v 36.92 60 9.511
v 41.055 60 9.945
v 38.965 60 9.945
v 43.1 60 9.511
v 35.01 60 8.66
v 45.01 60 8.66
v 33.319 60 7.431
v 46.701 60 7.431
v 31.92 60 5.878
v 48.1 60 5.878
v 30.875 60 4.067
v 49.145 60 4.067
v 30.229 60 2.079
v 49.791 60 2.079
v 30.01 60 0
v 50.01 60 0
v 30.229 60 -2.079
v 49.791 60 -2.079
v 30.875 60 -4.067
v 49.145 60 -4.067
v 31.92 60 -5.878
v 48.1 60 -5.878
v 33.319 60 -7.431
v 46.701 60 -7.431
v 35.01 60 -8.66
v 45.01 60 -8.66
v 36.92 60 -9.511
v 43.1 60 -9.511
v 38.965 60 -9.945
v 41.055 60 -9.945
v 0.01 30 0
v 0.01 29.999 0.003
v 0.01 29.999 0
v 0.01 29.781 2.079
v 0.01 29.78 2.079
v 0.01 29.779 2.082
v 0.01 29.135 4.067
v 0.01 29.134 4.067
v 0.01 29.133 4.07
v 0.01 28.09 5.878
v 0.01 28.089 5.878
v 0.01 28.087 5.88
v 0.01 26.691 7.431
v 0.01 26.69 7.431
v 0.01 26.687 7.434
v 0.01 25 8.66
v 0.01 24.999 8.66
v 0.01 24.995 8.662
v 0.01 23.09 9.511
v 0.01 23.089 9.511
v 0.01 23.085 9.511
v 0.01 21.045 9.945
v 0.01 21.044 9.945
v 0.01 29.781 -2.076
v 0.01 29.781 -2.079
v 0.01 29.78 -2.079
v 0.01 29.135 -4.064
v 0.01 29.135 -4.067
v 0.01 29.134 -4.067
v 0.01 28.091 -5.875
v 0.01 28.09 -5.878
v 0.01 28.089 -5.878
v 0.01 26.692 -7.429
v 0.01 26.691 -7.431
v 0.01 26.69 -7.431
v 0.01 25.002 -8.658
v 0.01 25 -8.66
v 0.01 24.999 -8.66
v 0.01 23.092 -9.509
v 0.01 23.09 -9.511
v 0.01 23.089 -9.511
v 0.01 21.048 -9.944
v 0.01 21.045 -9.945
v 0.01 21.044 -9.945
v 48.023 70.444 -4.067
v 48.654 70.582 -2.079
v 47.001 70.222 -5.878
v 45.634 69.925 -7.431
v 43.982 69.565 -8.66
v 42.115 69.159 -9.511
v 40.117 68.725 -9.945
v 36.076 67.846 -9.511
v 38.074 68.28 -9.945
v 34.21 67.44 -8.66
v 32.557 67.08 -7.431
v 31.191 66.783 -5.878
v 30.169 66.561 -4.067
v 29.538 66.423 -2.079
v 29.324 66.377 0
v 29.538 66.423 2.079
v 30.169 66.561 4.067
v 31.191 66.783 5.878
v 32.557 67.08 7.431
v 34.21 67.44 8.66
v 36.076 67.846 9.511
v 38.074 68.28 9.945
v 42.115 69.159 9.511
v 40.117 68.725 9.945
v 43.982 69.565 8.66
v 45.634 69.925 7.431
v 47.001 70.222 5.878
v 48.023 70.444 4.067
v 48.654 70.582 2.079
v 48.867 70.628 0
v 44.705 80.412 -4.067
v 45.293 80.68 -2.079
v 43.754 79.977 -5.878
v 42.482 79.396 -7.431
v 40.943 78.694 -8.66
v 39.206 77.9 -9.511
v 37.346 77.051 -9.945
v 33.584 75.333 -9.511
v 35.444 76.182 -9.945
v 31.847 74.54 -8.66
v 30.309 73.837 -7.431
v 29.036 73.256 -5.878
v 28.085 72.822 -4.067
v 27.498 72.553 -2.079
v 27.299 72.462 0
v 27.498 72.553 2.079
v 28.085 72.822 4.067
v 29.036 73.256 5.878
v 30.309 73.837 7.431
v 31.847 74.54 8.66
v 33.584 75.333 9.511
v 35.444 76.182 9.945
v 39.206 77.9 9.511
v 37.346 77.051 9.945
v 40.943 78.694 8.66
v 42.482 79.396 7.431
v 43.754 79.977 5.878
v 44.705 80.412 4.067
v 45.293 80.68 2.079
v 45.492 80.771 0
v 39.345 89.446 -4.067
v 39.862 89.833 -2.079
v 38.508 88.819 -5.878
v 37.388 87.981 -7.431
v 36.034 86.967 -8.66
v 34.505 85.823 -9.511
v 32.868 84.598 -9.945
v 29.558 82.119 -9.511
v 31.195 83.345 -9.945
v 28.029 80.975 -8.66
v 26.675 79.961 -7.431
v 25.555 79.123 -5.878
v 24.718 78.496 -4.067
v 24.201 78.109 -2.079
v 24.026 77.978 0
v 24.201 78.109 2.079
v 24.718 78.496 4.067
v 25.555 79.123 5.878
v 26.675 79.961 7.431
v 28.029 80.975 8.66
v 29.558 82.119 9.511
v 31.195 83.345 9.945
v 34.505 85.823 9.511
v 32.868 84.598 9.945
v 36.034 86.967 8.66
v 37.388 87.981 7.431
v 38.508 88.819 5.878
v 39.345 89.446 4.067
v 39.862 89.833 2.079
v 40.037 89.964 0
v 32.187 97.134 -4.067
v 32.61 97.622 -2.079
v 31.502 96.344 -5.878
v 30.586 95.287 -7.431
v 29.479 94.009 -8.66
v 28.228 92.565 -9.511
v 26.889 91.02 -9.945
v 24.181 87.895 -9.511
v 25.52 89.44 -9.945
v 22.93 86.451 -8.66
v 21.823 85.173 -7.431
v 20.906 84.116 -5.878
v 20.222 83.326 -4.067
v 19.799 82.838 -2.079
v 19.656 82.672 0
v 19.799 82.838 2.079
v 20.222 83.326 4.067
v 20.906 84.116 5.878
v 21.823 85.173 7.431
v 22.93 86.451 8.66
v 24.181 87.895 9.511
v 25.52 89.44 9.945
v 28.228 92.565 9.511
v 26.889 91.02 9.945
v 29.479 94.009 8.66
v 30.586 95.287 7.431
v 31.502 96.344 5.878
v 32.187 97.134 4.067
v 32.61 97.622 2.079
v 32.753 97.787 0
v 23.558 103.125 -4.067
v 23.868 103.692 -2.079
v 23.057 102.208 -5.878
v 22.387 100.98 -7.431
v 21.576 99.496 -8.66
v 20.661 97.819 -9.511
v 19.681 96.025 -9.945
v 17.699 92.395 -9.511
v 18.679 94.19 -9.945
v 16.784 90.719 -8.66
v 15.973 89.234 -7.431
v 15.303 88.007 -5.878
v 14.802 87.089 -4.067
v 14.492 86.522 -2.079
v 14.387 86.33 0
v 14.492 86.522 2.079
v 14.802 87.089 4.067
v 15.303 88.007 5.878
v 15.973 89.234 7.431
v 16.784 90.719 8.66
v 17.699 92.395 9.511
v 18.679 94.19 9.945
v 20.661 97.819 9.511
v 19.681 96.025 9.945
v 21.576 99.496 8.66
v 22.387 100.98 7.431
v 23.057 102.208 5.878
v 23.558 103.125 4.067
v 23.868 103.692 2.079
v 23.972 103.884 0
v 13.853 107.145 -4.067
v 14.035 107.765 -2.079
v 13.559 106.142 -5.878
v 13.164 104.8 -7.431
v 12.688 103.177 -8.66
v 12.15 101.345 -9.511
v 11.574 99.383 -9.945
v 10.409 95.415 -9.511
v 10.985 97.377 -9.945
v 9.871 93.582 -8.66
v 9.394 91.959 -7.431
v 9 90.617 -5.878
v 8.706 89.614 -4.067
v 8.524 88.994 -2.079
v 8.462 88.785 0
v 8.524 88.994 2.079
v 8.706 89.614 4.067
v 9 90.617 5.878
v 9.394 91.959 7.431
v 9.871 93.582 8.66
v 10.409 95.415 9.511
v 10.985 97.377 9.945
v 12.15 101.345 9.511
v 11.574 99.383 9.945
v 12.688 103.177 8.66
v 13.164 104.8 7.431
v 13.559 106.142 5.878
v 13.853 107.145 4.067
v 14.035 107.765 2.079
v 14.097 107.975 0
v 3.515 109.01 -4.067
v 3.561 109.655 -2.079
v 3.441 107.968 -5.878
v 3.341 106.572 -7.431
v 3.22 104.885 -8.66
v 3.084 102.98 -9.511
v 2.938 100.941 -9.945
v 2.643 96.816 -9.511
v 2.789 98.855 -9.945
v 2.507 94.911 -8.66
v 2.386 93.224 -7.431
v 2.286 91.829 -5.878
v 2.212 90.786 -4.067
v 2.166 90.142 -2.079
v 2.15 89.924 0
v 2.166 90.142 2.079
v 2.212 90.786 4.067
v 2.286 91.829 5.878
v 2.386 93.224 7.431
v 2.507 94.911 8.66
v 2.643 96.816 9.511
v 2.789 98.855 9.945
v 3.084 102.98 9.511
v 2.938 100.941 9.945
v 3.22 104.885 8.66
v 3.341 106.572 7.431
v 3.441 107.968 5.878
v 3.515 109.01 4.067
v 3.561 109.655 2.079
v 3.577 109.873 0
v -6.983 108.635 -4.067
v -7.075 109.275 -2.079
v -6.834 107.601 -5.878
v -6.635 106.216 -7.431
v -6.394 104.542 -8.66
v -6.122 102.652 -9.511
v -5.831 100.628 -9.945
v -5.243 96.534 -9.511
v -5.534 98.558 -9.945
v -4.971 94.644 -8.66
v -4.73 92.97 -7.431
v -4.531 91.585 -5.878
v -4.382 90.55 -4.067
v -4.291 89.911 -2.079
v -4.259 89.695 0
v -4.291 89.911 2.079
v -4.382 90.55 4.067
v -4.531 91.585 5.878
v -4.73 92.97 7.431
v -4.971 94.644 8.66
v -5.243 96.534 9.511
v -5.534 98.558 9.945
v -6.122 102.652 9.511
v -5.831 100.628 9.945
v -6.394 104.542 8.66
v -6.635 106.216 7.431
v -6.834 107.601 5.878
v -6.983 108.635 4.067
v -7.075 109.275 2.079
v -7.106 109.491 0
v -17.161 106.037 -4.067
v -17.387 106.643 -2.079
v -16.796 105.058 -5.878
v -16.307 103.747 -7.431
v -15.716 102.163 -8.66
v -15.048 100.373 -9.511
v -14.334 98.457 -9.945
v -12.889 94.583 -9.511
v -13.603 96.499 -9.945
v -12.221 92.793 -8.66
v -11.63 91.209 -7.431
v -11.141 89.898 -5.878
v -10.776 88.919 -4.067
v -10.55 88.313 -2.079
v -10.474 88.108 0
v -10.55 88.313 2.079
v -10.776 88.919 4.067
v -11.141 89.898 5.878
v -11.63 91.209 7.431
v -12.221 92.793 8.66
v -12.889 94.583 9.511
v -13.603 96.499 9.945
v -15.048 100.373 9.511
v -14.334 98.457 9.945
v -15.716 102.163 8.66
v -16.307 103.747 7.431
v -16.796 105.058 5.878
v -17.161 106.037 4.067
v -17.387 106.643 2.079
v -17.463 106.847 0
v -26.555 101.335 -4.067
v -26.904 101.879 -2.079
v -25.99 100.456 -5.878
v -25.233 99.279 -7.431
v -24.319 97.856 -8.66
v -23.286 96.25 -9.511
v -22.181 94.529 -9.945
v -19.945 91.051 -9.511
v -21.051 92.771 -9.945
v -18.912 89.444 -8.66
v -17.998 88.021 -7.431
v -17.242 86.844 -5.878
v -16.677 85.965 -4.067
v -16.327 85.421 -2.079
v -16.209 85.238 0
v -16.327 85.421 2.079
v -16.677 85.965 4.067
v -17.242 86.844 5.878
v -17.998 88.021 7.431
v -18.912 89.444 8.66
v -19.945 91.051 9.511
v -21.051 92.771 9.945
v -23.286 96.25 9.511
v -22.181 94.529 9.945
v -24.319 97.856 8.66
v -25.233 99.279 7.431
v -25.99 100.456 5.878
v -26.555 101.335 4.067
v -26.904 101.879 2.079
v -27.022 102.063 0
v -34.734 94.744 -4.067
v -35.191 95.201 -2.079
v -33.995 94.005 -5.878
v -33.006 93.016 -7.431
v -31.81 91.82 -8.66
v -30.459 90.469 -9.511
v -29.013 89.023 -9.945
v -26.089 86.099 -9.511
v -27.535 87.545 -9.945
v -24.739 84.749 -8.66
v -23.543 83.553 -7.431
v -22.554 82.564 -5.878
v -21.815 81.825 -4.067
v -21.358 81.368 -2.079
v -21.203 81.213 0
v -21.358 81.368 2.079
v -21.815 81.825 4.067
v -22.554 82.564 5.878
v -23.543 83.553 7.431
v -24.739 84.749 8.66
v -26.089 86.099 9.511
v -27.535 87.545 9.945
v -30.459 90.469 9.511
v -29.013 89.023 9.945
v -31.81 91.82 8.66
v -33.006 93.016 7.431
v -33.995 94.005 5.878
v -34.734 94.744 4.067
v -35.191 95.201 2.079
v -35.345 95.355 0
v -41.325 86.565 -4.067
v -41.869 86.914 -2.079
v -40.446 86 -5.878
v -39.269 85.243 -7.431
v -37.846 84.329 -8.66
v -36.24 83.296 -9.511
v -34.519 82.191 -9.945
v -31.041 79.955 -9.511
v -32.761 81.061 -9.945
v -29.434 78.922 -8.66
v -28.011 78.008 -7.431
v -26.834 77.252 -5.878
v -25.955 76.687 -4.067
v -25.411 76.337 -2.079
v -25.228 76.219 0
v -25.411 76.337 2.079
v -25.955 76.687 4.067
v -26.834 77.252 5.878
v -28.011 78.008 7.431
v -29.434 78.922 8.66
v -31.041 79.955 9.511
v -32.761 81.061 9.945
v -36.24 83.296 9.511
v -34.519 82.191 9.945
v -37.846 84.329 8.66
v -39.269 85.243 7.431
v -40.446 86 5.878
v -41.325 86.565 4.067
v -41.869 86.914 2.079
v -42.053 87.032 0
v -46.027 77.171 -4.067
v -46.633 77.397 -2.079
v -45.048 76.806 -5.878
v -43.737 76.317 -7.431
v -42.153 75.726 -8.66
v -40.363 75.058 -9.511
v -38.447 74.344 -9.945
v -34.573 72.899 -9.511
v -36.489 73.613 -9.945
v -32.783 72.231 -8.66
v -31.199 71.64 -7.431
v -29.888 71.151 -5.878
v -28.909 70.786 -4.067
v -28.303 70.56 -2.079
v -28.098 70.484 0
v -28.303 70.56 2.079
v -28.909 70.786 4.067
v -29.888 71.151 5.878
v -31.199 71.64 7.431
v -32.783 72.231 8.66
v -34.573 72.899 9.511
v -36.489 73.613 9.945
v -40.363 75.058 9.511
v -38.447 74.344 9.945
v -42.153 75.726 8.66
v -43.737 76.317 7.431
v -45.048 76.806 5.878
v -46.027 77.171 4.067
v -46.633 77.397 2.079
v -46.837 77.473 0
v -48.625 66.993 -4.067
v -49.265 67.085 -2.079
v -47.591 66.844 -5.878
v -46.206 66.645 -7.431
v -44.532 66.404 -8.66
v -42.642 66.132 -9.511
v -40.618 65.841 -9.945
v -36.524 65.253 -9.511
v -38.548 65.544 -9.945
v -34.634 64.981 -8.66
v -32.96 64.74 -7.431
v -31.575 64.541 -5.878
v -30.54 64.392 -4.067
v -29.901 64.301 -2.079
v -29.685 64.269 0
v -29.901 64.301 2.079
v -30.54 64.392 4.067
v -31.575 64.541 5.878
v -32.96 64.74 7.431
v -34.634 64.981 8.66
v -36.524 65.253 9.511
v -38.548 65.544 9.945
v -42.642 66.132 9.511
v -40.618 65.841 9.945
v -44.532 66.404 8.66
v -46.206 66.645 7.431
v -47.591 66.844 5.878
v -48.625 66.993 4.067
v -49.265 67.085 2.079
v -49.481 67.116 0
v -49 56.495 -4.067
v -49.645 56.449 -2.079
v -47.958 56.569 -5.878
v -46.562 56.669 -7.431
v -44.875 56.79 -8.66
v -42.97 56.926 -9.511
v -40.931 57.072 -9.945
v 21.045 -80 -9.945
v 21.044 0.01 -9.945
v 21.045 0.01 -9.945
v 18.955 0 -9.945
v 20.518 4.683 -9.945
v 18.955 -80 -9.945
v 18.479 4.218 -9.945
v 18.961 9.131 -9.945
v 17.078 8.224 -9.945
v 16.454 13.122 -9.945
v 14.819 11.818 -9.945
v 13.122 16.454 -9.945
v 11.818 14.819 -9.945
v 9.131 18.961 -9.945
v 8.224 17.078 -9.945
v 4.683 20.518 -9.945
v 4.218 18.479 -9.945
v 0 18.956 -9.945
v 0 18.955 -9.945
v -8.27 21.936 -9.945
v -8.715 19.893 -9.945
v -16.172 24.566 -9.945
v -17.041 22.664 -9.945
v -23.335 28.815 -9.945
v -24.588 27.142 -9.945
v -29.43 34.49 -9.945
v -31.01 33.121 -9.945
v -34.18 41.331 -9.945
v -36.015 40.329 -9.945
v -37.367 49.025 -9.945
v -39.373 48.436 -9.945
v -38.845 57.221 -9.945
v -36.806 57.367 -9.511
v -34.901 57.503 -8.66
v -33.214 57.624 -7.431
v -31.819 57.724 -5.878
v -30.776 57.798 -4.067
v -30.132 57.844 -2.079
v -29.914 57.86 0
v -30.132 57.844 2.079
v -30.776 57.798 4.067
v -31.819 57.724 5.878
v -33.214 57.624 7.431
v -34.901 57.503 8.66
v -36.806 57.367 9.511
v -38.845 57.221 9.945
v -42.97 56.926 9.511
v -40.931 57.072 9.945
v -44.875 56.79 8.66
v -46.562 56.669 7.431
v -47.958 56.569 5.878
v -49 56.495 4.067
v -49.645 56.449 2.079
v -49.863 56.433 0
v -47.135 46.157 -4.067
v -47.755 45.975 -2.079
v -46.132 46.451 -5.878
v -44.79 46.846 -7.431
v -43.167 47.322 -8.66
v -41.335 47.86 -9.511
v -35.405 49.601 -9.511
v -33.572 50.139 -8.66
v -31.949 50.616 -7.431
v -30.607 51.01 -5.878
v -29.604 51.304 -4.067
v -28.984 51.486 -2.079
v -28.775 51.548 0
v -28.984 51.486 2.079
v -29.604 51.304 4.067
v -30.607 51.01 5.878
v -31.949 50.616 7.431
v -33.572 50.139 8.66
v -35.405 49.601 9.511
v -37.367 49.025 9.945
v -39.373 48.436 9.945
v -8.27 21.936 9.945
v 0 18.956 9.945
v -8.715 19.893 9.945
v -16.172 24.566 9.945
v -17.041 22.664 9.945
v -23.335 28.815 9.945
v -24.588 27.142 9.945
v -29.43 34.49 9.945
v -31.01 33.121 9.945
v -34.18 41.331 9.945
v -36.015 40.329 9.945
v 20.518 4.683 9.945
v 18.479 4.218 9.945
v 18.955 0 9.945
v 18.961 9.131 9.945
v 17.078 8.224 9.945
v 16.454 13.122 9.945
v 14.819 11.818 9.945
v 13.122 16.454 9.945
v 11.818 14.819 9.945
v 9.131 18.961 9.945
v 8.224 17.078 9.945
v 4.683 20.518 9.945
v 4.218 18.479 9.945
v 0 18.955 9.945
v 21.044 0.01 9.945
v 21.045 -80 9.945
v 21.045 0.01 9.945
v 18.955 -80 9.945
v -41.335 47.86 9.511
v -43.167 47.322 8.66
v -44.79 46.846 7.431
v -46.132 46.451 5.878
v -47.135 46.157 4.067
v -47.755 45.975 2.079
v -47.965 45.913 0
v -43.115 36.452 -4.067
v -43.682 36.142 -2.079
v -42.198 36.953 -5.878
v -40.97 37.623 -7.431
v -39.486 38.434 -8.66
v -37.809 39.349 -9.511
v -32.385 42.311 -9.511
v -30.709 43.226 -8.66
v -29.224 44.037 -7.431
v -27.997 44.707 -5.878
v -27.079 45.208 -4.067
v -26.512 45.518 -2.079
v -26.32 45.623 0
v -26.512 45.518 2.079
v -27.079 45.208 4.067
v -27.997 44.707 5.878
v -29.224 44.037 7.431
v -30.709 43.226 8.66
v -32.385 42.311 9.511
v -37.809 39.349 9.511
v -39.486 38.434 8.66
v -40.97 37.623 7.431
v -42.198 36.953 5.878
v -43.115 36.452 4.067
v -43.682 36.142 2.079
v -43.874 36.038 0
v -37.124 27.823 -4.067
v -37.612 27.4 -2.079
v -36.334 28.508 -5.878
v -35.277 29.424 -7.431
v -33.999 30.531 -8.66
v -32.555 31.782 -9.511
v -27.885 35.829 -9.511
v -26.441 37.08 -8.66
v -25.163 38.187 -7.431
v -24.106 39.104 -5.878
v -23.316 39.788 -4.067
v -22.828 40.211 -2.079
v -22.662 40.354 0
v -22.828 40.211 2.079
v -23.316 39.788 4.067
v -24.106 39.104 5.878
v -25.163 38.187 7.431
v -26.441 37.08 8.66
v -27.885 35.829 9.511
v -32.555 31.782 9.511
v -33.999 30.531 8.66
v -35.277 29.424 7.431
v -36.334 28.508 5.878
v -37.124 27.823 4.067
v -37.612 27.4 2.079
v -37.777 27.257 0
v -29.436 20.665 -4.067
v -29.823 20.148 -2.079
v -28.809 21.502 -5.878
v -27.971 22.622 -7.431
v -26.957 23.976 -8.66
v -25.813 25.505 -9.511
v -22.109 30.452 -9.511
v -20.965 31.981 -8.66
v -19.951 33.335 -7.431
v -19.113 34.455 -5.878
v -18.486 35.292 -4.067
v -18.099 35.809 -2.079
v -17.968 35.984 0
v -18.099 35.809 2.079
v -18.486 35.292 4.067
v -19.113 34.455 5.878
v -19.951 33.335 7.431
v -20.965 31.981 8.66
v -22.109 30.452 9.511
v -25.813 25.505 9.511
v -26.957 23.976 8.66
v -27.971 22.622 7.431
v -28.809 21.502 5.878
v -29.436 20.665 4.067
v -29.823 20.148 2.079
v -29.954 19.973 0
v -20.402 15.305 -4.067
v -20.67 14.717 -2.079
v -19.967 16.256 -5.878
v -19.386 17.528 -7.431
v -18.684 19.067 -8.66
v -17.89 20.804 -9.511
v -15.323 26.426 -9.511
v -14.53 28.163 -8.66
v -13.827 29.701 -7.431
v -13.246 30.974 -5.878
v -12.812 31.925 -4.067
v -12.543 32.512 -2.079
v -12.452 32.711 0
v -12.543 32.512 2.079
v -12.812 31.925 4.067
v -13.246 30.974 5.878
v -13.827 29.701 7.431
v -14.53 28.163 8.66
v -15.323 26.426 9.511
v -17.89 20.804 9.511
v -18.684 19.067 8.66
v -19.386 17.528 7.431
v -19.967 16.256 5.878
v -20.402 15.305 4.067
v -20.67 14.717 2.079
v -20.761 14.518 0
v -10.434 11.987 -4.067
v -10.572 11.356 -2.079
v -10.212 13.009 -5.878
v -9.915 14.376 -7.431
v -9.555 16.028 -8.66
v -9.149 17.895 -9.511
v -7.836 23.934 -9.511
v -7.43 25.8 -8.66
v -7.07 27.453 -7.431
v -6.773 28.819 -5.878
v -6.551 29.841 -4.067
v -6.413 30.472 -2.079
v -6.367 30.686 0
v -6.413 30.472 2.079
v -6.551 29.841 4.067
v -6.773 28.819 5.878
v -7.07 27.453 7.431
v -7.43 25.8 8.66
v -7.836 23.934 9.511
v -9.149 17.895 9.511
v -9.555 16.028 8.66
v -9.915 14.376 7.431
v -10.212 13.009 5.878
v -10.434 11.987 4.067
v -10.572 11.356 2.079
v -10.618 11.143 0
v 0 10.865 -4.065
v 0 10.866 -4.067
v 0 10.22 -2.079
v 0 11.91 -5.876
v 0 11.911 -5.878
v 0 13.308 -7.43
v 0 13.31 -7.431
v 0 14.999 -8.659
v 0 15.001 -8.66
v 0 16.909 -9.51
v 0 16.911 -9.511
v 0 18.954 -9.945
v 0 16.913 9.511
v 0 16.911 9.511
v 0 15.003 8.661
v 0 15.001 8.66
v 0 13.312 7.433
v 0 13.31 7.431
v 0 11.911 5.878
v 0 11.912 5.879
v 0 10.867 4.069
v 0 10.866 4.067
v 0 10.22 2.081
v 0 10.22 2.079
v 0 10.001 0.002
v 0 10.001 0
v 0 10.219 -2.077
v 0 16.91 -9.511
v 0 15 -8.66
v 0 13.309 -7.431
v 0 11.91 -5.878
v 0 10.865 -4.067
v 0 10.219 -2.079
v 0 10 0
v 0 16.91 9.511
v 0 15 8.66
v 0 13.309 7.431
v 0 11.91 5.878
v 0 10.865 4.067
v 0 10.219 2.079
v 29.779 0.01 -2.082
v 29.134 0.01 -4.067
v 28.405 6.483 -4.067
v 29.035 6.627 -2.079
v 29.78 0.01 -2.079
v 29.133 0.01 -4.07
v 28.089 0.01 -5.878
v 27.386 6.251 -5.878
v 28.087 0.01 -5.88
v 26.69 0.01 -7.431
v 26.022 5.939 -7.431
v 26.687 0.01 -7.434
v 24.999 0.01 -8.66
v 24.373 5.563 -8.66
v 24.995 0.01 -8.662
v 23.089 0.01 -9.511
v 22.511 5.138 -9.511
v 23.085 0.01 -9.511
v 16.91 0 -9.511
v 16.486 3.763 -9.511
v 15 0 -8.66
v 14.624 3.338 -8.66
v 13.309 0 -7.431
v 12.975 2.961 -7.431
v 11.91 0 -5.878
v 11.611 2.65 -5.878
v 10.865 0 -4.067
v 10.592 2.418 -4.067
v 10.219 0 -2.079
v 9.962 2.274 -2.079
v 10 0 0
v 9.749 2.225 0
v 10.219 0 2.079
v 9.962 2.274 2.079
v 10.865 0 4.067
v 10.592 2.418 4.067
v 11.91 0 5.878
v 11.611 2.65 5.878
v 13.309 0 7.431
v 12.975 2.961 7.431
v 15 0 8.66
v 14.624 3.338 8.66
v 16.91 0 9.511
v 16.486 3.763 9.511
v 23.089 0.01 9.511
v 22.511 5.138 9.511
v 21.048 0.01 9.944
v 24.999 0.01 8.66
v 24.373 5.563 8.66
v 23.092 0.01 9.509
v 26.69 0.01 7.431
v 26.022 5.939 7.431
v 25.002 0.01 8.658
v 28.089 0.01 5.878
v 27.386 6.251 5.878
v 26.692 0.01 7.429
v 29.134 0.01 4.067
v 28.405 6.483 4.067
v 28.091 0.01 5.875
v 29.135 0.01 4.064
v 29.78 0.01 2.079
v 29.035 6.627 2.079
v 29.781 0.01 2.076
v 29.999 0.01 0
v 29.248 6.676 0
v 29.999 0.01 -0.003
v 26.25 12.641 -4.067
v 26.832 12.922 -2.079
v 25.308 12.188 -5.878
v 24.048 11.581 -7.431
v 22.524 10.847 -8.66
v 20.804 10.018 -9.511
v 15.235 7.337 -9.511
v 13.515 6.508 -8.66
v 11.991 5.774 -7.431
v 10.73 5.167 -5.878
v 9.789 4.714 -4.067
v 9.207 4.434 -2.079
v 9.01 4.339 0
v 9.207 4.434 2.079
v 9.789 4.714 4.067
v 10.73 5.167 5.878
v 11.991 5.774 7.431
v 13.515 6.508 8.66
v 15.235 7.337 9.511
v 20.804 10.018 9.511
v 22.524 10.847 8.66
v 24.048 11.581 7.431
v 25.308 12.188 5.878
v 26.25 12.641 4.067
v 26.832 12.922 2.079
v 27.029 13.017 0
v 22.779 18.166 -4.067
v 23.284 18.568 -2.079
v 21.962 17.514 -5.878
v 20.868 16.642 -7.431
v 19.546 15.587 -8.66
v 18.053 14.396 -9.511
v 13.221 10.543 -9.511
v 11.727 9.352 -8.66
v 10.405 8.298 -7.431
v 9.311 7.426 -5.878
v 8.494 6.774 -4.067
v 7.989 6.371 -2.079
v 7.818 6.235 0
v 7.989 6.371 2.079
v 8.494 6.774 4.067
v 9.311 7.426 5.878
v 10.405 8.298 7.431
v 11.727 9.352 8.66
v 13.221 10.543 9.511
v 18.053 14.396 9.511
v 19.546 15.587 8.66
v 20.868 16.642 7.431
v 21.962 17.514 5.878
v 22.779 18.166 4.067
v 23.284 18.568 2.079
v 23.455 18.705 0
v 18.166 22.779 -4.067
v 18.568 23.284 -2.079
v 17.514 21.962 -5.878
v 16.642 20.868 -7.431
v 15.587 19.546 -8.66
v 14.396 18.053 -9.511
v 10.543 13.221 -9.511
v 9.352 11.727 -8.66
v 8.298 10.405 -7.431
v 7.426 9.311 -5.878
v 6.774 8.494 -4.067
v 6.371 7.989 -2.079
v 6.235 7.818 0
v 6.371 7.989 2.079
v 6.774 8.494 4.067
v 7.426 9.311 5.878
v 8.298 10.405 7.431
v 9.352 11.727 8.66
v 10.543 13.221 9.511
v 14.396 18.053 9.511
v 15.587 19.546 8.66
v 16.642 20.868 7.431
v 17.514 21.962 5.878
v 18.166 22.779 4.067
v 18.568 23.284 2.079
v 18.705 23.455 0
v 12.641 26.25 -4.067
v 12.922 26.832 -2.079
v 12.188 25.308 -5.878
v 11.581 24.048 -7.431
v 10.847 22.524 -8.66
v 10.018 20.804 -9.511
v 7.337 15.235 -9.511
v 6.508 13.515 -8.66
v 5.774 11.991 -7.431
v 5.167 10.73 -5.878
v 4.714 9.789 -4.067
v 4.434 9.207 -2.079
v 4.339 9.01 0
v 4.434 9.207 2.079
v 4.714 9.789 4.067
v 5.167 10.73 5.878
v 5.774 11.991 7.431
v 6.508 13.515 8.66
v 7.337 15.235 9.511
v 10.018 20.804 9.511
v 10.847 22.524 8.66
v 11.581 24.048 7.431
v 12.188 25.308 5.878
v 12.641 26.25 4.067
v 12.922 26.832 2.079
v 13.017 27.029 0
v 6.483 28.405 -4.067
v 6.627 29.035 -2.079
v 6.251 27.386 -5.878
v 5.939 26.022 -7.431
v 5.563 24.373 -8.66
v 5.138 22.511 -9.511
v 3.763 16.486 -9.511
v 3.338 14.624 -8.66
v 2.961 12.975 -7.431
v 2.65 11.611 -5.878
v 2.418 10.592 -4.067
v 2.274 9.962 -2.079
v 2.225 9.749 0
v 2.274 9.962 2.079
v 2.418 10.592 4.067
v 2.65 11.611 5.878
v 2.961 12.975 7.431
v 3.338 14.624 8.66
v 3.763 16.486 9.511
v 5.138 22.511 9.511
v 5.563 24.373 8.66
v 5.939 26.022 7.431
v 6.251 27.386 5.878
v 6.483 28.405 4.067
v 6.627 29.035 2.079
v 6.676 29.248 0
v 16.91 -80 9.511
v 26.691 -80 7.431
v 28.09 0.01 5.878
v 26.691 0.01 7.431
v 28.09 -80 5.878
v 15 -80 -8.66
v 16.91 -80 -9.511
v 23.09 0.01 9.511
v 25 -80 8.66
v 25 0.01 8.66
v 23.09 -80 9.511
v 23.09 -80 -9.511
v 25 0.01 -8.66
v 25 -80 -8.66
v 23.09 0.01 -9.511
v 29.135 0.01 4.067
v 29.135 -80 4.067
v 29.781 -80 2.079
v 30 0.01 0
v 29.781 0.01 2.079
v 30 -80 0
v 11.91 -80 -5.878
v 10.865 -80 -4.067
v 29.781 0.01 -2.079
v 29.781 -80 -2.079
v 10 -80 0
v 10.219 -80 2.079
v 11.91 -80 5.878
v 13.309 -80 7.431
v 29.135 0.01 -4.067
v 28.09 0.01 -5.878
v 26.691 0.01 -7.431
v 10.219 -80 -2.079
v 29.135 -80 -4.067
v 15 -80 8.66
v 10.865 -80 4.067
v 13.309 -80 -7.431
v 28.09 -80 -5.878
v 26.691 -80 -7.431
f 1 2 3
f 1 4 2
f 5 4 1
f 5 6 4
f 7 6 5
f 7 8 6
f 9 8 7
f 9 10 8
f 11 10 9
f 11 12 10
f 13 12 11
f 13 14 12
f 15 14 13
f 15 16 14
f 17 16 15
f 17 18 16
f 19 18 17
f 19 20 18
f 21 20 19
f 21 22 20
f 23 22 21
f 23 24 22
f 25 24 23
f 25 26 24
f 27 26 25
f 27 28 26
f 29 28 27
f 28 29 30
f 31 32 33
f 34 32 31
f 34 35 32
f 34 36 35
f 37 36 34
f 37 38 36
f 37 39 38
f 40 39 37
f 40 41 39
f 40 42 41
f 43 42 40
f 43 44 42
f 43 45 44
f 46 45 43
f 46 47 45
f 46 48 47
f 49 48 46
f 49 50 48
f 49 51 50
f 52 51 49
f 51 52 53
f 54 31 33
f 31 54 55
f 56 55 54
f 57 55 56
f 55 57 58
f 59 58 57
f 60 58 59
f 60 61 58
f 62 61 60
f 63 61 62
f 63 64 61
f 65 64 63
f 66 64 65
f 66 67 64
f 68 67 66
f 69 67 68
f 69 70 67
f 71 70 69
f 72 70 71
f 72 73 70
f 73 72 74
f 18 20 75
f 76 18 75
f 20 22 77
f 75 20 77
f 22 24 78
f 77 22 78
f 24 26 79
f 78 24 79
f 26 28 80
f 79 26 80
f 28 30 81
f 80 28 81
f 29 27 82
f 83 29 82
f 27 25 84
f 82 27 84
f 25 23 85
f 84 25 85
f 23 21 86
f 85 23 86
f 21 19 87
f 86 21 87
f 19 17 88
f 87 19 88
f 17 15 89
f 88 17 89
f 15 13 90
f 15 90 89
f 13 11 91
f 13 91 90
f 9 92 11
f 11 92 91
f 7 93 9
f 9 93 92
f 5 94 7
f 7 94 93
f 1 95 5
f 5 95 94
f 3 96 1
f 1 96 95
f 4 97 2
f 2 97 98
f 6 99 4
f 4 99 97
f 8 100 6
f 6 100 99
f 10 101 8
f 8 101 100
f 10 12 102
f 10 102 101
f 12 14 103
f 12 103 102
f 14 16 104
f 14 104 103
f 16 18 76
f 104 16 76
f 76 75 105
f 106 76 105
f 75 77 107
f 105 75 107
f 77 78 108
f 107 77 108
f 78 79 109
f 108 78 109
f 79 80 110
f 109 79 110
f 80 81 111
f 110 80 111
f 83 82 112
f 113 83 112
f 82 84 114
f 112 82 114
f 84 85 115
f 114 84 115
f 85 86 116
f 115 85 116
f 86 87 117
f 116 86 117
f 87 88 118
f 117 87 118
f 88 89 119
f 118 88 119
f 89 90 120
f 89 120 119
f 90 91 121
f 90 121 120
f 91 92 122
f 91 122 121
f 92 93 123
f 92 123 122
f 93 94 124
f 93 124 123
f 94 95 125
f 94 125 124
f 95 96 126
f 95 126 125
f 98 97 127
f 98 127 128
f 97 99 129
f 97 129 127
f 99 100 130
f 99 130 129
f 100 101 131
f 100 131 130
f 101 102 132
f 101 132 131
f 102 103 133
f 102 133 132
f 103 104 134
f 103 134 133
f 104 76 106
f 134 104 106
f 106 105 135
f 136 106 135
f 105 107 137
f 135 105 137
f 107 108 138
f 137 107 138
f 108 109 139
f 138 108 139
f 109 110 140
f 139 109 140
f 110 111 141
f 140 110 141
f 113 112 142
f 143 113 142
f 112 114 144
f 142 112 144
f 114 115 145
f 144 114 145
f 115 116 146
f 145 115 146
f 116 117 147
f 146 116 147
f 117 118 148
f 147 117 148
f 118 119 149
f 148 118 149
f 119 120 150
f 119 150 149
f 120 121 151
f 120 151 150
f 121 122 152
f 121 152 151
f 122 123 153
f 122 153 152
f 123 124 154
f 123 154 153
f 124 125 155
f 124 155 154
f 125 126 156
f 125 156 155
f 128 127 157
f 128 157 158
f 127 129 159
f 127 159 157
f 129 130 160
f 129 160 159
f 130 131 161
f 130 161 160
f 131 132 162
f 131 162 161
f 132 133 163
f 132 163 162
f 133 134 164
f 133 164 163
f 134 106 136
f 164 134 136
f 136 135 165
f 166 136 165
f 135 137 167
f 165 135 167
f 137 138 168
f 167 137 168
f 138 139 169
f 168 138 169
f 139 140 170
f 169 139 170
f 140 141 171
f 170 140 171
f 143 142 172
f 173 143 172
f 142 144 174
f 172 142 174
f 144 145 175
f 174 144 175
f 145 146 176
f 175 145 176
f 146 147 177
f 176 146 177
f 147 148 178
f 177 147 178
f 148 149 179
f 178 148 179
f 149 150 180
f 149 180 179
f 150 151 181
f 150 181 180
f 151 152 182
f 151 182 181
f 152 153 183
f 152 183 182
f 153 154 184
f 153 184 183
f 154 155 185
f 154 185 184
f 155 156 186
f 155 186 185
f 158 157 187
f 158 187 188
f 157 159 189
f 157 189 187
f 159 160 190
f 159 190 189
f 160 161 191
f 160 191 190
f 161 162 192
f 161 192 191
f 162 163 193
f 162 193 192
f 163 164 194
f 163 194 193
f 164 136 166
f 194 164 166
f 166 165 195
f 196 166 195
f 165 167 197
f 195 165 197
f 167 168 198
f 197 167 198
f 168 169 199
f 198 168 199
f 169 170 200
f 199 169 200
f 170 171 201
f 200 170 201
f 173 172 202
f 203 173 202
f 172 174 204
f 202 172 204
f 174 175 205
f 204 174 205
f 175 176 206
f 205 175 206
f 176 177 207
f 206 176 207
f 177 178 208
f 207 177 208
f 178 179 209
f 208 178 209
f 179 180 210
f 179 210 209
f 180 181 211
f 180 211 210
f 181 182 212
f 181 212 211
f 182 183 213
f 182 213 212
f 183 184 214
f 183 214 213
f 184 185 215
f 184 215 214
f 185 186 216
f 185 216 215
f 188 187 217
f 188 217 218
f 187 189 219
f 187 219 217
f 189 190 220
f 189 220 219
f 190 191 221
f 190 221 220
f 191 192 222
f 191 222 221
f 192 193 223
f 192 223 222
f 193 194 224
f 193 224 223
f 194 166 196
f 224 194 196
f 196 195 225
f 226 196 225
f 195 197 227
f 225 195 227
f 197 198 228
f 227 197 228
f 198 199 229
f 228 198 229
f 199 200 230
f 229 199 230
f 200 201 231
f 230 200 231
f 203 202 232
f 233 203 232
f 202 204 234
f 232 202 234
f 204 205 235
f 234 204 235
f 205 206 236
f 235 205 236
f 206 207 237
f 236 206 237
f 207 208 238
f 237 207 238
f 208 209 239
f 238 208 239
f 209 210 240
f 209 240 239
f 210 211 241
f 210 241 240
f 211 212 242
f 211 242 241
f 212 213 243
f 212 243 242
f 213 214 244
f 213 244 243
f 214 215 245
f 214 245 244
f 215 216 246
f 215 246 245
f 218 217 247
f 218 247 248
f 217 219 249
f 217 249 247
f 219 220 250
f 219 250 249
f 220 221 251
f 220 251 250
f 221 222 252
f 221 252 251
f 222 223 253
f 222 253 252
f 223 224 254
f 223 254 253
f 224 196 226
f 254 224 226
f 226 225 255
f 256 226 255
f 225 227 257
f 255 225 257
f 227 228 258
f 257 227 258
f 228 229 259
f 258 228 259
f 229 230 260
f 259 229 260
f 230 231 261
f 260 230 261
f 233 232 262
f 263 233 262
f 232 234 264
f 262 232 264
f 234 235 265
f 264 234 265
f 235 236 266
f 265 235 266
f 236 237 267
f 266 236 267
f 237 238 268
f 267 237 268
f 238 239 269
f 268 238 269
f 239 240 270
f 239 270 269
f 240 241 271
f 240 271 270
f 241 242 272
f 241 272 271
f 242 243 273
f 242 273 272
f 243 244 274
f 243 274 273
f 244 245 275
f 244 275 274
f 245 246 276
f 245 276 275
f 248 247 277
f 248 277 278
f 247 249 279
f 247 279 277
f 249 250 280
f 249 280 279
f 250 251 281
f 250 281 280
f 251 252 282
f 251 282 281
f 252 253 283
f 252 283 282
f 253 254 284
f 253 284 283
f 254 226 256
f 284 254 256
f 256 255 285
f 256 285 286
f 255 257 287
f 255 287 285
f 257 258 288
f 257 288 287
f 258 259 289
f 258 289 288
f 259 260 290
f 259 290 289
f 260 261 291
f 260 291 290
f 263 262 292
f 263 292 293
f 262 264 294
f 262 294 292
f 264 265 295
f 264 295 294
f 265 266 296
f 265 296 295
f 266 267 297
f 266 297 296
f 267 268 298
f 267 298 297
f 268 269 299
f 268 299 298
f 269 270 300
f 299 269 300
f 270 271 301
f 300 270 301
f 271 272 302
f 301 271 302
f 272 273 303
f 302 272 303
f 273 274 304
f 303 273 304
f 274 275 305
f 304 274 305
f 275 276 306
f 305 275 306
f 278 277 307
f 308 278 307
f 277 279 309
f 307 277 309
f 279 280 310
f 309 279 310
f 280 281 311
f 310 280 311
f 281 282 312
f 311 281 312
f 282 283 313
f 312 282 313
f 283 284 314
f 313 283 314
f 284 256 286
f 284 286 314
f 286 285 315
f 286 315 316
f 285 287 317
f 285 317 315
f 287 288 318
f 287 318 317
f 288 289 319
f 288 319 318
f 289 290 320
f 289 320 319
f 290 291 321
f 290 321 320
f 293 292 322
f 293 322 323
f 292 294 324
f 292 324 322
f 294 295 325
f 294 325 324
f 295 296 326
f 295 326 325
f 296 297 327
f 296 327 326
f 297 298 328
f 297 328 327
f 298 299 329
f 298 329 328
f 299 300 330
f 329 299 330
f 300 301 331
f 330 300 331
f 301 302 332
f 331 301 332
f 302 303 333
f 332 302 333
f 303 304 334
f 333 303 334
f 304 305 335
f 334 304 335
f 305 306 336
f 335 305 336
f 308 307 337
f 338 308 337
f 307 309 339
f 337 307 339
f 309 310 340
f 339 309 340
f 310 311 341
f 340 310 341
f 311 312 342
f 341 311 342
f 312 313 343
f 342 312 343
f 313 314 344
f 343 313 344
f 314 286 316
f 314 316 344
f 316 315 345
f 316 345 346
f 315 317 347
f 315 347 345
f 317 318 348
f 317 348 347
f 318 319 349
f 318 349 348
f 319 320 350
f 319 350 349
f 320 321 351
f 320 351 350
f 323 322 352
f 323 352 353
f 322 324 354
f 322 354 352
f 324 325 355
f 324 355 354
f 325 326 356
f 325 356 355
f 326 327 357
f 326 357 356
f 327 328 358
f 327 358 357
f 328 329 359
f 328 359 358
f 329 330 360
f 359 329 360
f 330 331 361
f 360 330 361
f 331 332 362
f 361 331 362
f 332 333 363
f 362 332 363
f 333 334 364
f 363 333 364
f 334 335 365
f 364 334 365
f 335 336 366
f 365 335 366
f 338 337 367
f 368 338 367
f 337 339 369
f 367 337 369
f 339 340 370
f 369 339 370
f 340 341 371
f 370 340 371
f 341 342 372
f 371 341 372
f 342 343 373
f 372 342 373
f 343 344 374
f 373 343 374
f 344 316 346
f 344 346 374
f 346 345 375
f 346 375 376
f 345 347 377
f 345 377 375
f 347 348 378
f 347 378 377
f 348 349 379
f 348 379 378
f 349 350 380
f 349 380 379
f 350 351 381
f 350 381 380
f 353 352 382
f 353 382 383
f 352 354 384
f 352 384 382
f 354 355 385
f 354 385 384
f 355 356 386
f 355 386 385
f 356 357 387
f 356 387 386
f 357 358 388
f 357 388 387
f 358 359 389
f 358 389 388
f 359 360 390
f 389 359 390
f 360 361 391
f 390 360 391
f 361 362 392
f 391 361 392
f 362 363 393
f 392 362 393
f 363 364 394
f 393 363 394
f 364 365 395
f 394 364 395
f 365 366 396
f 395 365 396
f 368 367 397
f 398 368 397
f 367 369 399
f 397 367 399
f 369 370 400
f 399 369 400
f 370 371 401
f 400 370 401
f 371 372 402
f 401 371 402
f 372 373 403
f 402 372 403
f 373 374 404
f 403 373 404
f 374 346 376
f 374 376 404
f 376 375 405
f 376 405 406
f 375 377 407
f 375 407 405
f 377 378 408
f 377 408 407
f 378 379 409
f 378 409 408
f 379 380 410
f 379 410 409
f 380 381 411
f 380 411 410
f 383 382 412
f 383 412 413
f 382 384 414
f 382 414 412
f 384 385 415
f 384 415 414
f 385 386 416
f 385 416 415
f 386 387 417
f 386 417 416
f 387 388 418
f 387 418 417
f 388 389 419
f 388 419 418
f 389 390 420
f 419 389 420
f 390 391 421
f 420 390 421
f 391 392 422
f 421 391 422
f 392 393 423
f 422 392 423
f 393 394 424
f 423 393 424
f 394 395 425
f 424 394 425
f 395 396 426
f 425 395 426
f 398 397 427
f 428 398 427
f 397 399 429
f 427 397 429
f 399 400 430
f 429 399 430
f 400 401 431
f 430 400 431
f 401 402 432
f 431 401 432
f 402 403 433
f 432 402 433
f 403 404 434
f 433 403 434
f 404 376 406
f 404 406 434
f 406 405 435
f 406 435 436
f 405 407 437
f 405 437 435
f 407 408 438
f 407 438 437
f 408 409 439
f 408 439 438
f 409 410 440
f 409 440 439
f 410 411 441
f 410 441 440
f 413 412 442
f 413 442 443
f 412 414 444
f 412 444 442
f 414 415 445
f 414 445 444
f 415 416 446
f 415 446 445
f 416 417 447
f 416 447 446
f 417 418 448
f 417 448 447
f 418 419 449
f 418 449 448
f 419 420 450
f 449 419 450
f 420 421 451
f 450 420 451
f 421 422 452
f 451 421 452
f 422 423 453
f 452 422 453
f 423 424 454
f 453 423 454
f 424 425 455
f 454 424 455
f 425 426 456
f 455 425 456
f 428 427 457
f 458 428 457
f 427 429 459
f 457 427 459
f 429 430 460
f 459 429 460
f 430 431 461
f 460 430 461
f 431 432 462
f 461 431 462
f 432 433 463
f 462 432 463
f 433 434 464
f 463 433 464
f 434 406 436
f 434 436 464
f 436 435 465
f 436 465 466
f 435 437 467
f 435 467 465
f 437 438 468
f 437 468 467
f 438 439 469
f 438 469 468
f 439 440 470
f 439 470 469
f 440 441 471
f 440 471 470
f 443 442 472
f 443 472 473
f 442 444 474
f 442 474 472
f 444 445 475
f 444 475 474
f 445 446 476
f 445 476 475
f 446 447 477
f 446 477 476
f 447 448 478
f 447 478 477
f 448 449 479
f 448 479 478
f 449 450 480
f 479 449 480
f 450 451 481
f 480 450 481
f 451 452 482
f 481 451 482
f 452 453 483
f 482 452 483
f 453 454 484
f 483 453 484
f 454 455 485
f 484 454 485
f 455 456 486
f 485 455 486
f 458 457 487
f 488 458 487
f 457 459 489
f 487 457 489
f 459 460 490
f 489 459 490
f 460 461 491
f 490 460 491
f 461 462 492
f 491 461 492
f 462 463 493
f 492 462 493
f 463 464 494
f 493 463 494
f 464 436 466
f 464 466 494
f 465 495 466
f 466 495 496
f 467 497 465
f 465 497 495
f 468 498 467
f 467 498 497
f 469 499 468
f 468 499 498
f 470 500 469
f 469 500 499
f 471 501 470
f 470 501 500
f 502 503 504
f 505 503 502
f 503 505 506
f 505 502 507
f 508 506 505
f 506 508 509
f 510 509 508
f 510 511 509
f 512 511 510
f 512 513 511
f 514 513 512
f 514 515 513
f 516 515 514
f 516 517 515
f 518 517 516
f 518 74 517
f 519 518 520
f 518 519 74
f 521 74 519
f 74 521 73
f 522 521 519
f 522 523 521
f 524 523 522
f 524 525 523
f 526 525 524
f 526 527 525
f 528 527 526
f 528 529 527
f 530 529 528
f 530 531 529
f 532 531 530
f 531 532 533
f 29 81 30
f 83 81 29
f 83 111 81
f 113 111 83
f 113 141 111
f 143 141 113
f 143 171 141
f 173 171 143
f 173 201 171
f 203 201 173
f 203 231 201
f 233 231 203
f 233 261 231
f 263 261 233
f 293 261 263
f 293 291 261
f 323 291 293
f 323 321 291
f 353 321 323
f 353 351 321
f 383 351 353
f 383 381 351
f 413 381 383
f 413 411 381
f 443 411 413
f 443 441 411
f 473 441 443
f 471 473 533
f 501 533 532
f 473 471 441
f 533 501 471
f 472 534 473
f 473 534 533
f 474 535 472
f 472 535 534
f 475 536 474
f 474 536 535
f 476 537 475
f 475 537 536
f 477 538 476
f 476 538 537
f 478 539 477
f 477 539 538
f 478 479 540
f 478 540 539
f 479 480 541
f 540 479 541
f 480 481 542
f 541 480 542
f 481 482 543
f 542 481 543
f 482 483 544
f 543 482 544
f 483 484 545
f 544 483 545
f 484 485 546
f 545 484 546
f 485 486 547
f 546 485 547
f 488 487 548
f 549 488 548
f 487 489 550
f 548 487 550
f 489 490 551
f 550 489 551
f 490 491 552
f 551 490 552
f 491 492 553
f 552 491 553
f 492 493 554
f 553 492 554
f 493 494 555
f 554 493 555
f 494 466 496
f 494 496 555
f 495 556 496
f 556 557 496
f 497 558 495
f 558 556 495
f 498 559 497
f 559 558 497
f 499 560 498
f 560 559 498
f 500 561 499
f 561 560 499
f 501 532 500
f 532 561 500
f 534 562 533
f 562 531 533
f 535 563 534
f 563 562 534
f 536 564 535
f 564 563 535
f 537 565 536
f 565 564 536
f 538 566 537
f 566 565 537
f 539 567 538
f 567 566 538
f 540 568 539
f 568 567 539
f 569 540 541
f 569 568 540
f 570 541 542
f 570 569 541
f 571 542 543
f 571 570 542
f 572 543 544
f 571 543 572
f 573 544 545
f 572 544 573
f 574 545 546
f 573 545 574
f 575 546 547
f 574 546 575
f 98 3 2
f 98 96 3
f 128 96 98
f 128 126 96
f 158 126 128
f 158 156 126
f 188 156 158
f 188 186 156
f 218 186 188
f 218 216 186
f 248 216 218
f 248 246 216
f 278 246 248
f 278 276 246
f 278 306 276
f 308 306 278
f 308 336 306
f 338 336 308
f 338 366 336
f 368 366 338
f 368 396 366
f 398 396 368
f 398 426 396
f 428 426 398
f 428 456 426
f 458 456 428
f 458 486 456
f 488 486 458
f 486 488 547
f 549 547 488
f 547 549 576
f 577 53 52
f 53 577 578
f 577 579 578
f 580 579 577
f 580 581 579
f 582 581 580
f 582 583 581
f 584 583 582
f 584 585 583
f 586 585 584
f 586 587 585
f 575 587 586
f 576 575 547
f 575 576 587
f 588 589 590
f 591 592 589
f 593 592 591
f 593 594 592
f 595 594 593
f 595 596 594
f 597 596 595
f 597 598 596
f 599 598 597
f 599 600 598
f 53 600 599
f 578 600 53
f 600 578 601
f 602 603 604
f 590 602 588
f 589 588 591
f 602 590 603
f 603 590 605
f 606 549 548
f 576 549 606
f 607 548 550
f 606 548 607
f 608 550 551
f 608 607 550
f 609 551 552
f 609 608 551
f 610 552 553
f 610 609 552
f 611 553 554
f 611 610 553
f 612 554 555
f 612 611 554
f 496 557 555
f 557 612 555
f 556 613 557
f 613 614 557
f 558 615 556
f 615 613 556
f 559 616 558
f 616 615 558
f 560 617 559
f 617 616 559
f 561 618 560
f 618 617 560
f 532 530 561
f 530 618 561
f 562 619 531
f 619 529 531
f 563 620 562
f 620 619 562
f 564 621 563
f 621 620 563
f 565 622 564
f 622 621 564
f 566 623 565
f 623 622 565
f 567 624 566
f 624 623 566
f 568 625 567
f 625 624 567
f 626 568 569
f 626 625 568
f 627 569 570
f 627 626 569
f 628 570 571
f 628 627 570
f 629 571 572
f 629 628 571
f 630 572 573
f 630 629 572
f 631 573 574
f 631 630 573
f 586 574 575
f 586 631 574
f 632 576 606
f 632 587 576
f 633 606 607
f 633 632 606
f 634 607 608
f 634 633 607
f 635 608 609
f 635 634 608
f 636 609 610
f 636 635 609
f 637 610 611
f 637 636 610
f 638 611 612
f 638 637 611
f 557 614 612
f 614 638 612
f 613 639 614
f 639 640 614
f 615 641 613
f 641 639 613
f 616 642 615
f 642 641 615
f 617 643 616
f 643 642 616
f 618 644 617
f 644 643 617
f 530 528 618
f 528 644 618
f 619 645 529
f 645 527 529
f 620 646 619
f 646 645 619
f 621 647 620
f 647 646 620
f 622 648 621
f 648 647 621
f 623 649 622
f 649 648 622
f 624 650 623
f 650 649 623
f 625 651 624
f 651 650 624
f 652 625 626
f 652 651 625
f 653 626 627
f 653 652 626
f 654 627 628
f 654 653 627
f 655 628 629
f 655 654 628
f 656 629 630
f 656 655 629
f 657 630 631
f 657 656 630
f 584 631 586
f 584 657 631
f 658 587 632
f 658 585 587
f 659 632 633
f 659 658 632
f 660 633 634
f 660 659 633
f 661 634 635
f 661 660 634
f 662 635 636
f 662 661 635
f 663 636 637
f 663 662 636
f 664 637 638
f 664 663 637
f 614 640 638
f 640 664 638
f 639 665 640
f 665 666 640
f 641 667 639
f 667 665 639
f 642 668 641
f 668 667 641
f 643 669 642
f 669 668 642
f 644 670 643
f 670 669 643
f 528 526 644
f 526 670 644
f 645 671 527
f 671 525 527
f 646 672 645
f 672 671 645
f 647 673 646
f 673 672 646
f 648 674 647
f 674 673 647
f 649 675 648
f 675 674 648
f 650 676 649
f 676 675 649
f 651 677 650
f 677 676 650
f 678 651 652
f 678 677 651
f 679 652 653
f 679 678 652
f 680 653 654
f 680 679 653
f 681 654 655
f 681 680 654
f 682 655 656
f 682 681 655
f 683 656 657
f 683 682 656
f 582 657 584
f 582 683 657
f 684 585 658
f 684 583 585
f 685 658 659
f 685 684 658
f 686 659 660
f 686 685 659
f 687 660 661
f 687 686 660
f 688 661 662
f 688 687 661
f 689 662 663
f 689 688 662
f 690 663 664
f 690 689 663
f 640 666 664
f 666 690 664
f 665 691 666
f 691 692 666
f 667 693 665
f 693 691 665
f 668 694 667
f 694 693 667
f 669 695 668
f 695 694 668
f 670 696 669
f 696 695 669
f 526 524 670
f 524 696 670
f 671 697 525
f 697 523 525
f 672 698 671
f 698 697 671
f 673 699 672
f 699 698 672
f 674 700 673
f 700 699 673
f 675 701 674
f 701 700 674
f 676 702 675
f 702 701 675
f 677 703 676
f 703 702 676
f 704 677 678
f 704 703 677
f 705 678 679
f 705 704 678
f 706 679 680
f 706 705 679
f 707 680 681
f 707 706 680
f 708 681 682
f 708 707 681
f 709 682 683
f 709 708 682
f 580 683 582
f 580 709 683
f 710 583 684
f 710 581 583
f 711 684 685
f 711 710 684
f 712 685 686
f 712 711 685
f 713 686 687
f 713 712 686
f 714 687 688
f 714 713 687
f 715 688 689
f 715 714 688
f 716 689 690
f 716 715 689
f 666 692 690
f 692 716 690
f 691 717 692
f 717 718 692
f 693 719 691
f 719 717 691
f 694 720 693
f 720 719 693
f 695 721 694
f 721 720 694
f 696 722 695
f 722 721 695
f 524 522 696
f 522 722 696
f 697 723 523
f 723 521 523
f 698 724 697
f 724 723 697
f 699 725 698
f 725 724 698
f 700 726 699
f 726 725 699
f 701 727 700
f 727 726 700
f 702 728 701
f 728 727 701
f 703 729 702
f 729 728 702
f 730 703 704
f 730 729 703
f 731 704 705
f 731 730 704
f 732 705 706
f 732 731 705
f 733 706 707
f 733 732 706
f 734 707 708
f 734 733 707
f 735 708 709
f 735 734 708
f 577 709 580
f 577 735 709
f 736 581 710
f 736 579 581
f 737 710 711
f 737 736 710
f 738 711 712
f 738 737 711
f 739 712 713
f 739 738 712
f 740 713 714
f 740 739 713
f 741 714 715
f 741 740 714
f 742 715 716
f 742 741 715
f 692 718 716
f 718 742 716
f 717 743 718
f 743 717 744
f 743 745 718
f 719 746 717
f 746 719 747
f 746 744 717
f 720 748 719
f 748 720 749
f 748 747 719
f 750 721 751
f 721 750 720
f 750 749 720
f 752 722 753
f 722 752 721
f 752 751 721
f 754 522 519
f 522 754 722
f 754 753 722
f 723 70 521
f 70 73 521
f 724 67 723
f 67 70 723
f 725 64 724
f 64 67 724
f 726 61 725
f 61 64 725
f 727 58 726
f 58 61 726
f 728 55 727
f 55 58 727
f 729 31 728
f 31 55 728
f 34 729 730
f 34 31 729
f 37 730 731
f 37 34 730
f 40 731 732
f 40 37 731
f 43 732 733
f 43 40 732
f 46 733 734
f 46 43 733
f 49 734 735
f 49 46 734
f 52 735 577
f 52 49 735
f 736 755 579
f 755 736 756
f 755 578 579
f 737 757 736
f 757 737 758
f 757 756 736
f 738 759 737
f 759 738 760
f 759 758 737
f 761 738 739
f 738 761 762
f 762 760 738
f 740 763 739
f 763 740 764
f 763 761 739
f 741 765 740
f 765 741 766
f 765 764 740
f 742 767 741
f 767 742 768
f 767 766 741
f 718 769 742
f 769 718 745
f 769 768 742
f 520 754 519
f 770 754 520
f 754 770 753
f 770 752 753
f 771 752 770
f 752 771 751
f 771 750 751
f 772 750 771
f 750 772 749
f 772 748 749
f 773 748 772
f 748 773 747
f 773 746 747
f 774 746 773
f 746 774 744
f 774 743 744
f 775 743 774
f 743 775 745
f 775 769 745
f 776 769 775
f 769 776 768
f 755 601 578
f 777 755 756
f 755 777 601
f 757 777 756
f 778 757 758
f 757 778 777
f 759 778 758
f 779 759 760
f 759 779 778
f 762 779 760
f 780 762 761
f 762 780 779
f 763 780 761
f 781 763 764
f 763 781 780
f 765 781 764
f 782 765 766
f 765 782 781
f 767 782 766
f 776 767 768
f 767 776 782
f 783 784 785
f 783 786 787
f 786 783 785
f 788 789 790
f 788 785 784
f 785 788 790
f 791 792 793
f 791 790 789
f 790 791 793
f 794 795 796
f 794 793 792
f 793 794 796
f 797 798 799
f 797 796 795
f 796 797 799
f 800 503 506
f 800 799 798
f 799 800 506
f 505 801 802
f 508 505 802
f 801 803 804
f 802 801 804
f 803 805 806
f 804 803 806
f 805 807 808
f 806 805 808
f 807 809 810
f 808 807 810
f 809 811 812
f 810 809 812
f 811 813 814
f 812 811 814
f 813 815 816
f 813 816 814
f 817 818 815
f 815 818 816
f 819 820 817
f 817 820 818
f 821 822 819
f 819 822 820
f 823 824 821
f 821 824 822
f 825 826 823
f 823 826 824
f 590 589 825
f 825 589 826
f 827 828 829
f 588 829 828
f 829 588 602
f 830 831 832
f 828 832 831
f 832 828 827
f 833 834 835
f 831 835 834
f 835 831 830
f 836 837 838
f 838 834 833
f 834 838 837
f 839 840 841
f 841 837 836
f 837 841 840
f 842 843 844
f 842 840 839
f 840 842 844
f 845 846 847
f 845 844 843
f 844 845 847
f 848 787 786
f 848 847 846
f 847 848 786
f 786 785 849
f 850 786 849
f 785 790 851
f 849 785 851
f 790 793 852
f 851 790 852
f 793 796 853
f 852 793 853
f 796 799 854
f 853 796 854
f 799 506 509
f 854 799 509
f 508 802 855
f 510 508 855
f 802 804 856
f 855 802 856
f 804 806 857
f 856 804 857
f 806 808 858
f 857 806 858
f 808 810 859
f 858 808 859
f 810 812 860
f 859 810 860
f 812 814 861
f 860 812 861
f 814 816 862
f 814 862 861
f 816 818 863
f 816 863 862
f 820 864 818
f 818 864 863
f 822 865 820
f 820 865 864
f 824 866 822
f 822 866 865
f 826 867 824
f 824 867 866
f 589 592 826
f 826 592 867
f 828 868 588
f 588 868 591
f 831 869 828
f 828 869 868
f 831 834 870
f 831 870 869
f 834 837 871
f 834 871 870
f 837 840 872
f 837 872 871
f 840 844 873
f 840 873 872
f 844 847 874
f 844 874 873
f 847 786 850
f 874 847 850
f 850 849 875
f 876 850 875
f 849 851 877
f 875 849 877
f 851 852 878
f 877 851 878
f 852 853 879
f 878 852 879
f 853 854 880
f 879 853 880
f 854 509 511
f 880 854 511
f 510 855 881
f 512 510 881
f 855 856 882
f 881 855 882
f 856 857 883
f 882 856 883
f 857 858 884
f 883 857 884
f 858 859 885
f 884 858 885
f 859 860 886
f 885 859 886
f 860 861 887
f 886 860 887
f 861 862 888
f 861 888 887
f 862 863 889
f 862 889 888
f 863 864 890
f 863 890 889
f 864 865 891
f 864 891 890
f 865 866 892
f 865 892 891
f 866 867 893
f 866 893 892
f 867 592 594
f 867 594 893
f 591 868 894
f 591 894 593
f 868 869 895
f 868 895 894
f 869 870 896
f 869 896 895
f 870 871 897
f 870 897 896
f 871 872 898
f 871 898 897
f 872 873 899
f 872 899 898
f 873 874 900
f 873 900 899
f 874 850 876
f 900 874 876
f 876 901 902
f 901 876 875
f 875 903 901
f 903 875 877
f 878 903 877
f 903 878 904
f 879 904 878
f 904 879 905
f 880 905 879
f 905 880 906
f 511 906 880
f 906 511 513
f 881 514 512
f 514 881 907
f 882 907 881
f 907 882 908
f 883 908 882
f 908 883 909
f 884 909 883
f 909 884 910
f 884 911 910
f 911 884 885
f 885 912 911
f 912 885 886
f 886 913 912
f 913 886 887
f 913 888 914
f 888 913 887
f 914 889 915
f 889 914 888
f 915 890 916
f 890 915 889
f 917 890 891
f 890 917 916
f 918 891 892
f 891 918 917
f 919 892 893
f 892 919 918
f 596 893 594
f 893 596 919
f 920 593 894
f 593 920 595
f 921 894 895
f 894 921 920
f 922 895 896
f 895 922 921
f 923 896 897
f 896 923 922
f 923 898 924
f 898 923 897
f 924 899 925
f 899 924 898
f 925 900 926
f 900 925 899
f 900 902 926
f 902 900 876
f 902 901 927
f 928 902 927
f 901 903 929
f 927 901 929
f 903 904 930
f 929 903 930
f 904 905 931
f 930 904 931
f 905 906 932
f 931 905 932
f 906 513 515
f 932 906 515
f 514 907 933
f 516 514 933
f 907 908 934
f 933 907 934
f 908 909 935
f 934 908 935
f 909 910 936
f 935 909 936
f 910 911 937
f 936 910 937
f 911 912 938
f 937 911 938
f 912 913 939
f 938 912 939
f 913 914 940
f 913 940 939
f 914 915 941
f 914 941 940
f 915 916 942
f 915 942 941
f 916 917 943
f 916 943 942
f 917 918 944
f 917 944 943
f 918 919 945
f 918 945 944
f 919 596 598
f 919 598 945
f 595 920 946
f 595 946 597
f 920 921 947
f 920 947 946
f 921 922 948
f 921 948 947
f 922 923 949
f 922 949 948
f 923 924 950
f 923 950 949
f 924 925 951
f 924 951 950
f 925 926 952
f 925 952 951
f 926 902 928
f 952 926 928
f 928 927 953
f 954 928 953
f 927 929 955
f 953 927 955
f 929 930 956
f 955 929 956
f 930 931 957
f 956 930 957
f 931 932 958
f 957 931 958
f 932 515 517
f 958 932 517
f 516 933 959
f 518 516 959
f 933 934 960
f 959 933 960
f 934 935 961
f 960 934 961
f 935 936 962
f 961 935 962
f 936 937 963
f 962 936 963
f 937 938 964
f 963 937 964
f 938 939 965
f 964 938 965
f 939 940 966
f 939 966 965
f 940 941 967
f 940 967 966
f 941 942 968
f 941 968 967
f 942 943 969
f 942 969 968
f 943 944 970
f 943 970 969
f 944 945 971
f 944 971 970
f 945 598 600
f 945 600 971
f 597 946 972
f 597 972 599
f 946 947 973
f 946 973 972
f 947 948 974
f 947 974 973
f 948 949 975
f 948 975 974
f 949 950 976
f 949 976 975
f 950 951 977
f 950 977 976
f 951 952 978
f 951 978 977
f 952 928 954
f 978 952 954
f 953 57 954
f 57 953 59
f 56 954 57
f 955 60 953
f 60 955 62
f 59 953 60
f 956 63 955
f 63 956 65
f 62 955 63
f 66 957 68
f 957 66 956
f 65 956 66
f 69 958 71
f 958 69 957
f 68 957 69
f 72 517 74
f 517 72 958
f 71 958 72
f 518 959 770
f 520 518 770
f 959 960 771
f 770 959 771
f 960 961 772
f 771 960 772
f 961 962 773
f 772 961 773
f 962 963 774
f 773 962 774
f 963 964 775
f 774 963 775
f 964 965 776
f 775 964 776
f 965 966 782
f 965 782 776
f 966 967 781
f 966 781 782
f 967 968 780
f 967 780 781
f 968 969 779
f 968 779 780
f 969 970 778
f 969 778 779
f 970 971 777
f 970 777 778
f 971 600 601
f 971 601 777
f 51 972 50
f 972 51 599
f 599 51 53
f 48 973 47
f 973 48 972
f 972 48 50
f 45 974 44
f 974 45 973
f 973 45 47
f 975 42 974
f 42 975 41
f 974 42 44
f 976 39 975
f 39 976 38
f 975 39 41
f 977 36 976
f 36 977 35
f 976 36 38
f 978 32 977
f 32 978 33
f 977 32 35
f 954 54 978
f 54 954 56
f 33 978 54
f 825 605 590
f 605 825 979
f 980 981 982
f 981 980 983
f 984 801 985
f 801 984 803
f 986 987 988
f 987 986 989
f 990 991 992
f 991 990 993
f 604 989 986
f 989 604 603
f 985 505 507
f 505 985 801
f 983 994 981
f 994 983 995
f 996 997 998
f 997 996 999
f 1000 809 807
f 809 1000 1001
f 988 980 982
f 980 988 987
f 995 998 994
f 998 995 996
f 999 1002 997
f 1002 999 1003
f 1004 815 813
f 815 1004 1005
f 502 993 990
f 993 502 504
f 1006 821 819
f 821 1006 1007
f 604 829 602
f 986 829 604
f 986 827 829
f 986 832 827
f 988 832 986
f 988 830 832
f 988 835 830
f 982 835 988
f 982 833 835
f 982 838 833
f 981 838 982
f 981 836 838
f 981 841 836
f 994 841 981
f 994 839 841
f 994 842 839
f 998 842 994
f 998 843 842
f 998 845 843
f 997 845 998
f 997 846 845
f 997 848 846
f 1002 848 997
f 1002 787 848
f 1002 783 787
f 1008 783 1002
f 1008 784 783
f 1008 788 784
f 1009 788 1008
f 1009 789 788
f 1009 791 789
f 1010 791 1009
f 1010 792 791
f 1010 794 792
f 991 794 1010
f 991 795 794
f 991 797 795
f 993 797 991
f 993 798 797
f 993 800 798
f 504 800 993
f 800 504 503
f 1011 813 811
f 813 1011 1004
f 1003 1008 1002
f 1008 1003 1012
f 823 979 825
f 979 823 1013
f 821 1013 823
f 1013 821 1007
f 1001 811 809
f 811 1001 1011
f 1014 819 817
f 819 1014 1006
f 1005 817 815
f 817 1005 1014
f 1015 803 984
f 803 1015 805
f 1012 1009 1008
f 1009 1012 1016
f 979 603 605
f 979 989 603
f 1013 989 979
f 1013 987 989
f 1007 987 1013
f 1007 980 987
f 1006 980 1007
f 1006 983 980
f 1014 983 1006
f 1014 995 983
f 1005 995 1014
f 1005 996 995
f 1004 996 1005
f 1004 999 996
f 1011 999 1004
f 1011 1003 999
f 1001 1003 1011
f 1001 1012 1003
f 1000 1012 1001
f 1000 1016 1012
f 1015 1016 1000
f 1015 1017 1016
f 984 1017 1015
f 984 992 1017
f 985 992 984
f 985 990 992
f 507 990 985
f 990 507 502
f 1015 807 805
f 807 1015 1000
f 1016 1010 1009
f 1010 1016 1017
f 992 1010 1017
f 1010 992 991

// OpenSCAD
// Unit of length: Unit.MM
union()
{
   translate(v = [0.01, 60.0, 0.0])
   {
      rotate_extrude(angle = 270.0, convexity = 10)
      {
         translate(v = [40.0, 0.0])
         {
            circle(r = 10.0);
         }
      }
   }
   rotate_extrude(angle = 90.0, convexity = 10)
   {
      translate(v = [20.0, 0.0])
      {
         circle(r = 10.0);
      }
   }
   translate(v = [20.0, 0.01])
   {
      rotate(a = [90.0, 0.0, 0.0])
      {
         cylinder(h = 80.01, d = 20.0, center = false);
      }
   }
}
